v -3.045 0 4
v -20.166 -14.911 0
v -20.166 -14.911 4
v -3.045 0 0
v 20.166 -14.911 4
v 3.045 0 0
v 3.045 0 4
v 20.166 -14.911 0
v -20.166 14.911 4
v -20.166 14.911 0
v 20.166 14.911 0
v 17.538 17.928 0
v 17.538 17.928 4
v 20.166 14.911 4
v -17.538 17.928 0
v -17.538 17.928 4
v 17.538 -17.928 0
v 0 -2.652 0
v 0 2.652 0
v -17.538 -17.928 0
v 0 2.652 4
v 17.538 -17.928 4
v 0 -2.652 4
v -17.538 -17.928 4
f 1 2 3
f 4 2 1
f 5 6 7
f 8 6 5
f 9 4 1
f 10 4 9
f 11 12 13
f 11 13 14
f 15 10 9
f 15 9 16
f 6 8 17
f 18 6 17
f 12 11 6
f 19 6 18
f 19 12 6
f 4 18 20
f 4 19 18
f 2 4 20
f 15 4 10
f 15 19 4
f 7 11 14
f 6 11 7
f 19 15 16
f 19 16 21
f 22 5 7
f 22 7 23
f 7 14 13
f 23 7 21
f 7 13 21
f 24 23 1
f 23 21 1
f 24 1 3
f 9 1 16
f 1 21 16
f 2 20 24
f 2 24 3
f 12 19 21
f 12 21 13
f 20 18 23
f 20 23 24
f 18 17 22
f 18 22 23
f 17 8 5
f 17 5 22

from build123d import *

# Parameters (mm, degrees)
BOSS_EXTRUDE1_DEPTH = 4


with BuildPart() as part:
    # Sketch1 → Boss-Extrude1 (new body)
    with BuildSketch(Plane.XY):
        Polygon((-20.165601387, 14.911355428), (-17.538478408, 17.927681812), (20.165601387, -14.911355428), (17.538478408, -17.927681812), align=None)
        Polygon((-17.538478408, -17.927681812), (-20.165601387, -14.911355428), (17.538478408, 17.927681812), (20.165601387, 14.911355428), align=None)
    extrude(amount=BOSS_EXTRUDE1_DEPTH)


solid = part.part
